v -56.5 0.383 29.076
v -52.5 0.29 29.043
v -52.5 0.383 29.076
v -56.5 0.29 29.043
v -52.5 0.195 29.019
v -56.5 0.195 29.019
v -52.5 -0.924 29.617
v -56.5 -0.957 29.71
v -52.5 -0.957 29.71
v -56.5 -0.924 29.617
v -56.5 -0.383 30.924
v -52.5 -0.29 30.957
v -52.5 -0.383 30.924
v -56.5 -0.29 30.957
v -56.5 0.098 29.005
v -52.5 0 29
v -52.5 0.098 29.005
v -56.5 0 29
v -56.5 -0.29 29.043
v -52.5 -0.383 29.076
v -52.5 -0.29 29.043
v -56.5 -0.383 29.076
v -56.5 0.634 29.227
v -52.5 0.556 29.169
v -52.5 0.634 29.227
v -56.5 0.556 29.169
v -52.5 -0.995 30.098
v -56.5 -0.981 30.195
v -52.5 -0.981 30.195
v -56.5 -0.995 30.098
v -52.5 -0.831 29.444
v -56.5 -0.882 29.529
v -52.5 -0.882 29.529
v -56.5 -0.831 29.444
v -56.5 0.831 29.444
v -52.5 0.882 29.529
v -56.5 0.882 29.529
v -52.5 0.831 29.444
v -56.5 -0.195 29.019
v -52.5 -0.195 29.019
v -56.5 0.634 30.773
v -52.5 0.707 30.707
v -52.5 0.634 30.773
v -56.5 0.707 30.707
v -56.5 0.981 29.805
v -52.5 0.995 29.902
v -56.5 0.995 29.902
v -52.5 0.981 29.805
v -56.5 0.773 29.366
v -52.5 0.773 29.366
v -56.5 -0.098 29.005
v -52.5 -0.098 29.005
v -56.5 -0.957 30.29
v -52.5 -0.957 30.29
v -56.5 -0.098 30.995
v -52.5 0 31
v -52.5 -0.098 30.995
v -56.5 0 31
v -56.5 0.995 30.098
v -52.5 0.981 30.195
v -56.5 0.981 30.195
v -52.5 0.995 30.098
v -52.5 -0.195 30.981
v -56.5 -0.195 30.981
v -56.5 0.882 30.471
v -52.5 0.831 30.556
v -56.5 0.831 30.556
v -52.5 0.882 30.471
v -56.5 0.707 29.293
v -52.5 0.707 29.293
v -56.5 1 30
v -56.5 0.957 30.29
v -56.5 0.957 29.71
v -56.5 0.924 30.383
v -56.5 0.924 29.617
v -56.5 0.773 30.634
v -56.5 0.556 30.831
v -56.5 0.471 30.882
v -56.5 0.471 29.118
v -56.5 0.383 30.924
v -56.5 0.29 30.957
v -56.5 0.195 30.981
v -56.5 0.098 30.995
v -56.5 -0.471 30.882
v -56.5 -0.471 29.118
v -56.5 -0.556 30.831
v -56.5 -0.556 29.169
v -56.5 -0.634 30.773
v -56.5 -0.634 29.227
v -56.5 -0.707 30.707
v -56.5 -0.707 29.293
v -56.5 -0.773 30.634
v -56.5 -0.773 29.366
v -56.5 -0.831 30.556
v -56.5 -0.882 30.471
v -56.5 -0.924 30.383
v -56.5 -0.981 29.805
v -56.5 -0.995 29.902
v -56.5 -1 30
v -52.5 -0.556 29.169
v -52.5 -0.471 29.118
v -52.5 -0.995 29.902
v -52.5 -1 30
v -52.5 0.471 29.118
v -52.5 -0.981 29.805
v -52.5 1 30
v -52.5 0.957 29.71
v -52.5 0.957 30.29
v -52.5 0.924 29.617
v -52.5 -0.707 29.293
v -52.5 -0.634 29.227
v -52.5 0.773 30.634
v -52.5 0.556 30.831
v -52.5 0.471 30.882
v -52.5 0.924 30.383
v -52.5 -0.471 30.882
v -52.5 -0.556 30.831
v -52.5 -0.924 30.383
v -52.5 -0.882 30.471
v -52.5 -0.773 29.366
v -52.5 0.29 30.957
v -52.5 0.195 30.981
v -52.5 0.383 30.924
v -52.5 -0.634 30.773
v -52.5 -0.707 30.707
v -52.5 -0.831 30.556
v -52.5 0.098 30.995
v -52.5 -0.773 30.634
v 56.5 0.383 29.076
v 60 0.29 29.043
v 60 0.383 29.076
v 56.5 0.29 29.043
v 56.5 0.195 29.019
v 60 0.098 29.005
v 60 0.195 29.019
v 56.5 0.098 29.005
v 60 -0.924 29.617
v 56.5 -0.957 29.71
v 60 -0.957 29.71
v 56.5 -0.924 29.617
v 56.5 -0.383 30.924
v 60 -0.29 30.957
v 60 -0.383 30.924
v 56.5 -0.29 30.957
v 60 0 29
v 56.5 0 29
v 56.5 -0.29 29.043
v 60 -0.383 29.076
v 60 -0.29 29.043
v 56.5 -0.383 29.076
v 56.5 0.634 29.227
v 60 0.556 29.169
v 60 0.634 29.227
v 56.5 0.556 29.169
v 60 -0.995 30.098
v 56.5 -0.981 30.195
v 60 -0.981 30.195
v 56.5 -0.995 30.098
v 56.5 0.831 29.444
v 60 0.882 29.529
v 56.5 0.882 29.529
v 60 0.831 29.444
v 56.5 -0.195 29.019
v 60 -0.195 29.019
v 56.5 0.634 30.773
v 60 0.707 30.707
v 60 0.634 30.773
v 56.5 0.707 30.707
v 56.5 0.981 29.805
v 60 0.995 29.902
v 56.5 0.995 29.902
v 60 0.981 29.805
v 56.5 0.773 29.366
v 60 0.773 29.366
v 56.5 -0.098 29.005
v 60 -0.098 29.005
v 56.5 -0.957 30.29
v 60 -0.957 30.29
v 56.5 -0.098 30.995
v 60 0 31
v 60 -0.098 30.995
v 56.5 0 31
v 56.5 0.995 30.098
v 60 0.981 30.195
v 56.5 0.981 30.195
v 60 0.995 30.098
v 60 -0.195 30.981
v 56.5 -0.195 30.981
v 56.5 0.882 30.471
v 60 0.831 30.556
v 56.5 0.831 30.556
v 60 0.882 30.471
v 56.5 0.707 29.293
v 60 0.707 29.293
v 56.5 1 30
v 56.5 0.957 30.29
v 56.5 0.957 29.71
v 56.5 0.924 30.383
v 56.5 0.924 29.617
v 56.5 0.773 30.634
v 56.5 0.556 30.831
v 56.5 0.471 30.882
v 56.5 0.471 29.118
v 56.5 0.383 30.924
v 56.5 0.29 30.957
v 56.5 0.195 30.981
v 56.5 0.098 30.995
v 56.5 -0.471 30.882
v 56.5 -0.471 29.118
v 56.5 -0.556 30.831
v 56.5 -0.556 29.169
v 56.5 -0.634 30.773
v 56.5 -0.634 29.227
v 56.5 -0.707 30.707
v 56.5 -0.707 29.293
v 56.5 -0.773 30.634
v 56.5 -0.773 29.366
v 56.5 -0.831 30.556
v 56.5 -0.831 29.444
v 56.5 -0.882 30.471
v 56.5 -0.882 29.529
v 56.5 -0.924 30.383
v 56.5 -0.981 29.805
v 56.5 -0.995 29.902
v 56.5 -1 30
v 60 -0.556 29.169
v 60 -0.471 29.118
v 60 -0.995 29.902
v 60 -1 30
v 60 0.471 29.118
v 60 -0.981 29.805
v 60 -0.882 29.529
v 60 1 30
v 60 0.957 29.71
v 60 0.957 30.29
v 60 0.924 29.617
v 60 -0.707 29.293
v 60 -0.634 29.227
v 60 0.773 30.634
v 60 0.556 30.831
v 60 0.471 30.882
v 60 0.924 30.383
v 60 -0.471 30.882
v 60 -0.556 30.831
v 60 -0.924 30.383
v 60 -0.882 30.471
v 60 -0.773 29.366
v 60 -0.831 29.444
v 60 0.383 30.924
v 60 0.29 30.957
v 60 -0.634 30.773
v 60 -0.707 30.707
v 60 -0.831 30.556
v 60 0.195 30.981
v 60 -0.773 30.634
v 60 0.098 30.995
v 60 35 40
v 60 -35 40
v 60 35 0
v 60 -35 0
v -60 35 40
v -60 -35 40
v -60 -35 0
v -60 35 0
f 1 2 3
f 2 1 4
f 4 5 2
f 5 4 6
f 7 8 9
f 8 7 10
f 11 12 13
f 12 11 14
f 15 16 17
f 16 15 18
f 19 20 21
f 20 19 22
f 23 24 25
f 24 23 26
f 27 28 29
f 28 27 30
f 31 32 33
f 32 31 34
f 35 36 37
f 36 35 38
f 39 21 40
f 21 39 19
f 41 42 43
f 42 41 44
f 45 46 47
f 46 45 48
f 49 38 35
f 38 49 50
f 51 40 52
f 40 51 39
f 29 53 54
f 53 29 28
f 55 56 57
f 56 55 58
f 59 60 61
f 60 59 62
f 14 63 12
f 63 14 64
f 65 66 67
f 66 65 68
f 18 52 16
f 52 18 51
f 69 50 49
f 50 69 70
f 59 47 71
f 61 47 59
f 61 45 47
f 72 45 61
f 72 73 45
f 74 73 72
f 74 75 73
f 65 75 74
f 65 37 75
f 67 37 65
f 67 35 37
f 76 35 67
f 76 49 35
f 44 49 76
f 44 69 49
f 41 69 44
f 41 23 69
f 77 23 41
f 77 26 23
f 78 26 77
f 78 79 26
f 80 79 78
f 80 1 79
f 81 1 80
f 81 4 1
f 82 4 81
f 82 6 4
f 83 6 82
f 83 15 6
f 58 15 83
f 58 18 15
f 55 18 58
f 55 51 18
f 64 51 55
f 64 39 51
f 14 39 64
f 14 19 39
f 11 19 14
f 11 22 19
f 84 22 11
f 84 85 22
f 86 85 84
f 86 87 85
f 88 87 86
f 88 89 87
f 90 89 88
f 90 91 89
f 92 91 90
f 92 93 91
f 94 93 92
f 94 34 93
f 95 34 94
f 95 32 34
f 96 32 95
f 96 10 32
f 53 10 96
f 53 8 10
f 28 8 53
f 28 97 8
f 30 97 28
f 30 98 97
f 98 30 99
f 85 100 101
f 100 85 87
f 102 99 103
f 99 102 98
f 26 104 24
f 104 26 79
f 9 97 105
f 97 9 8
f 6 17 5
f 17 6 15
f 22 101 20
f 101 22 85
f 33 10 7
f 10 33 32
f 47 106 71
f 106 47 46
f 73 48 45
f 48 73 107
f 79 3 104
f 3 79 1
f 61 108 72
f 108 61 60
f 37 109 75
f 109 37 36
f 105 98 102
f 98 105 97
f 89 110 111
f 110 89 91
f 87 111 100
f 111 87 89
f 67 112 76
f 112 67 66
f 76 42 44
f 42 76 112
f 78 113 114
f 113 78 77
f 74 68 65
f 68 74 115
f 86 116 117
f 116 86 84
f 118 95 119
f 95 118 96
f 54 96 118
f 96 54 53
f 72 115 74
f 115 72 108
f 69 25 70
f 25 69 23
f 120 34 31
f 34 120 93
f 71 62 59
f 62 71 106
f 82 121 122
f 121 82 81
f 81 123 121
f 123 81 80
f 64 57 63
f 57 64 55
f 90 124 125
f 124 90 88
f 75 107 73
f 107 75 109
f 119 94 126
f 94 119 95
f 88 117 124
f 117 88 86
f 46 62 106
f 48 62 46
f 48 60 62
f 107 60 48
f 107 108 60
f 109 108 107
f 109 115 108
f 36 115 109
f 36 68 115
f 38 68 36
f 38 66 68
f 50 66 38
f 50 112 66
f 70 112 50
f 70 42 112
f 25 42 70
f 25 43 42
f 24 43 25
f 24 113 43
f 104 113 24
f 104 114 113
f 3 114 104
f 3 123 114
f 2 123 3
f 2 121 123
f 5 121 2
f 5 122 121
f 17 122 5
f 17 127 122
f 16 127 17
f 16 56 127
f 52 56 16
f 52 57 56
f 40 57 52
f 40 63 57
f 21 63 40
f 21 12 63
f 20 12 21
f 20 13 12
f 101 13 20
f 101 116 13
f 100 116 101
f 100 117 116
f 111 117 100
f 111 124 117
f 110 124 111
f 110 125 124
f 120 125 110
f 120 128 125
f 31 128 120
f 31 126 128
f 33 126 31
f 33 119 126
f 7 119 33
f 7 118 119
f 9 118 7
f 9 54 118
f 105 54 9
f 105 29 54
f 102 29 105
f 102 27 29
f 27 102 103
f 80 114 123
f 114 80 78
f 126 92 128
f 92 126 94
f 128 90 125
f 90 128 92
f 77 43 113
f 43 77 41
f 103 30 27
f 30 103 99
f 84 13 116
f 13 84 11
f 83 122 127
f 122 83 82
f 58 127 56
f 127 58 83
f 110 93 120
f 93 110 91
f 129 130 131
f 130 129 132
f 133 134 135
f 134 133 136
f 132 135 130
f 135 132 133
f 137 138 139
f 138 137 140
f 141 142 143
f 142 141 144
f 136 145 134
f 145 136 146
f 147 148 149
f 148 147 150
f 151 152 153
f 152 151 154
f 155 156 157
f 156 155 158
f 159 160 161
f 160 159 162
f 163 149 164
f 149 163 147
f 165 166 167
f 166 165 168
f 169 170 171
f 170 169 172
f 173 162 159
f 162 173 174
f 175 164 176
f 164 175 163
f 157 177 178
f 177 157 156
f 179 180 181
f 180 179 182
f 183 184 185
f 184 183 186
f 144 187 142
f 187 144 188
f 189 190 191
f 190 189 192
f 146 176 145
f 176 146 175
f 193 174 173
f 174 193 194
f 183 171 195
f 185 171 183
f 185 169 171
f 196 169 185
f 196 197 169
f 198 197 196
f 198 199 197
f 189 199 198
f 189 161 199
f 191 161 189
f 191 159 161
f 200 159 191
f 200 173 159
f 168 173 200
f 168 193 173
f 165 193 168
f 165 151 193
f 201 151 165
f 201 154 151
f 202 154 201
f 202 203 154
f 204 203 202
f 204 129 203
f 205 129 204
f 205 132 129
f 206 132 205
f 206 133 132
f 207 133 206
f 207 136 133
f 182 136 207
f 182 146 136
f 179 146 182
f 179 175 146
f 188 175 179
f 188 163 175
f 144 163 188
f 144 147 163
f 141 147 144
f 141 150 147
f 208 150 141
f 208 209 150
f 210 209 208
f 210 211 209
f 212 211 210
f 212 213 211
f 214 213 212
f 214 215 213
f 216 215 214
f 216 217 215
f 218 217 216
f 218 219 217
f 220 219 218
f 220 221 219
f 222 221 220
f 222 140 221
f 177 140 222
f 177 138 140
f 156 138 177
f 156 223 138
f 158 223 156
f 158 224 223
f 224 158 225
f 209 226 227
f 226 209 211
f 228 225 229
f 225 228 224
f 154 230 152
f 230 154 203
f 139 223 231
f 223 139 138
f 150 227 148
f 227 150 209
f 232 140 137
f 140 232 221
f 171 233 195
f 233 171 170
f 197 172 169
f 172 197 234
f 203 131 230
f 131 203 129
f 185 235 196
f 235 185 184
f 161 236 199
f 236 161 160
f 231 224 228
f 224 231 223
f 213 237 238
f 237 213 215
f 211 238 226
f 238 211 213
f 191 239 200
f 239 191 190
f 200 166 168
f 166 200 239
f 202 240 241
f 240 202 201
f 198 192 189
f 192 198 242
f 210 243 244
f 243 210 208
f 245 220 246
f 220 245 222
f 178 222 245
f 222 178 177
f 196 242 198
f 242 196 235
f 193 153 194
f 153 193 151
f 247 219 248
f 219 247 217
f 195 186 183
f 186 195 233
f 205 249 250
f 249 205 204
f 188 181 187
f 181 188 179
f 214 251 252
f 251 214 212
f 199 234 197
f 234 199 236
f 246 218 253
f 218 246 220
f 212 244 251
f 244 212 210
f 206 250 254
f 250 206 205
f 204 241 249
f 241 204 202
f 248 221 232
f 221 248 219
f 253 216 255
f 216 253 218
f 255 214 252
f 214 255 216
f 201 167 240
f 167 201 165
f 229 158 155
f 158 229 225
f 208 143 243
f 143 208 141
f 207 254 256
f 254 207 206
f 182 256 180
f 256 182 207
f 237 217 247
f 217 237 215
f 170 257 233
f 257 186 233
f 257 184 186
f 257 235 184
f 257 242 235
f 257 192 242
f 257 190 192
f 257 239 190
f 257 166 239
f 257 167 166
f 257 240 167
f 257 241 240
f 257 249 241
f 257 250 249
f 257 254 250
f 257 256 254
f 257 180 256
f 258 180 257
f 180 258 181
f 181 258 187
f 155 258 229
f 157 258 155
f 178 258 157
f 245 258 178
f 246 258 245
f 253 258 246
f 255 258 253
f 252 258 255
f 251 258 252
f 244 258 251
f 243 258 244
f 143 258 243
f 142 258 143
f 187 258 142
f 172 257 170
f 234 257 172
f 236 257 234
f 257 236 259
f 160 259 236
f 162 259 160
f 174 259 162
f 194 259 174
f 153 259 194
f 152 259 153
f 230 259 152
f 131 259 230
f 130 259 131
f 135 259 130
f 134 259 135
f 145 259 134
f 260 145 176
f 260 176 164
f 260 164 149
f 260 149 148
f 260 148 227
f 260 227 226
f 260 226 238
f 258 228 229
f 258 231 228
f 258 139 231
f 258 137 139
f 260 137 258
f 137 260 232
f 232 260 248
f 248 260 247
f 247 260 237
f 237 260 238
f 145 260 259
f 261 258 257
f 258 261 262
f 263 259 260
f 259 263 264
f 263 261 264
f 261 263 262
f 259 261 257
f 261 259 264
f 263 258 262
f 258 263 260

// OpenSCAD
// Mini horizontal gel-electrophoresis box - buffer tank
// Print orientation: tank rests on XY plane, builds up in +Z

$fn = 64;

// ---- Tank dimensions ----
outer_x = 120;   // outer length in X
outer_y = 70;    // outer width in Y
outer_z = 40;    // outer height in Z
wall    = 3;     // wall thickness
floor   = 3;     // floor thickness

// ---- Platform dimensions ----
plat_x     = 60;   // platform length in X (centred)
plat_y     = outer_y; // platform spans full inner width
plat_top_z = 13;   // platform top height (10 mm above inner floor)

// ---- Electrode holes ----
hole_d     = 2;    // hole diameter
hole_y     = 0;    // hole Y position
hole_z     = 30;   // hole Z position

// ---- Derived ----
inner_x = outer_x - 2 * wall;
inner_z = outer_z - wall;
eps     = 0.5;     // cutter overshoot

difference() {
    // Tank body
    translate([-outer_x / 2, -outer_y / 2, 0])
        cube([outer_x, outer_y, outer_z]);

    // Platform (solid, no internal walls)
    translate([-plat_x / 2, -plat_y / 2, outer_z - floor])
        cube([plat_x, plat_y, plat_top_z - (outer_z - floor)]);

    // Electrode holes through end walls along X
    for (sx = [-1, 1])
        translate([sx * (inner_x / 2 - eps), hole_y, hole_z])
            rotate([0, 90, 0])
                cylinder(d = hole_d, h = wall + 2 * eps);
}
